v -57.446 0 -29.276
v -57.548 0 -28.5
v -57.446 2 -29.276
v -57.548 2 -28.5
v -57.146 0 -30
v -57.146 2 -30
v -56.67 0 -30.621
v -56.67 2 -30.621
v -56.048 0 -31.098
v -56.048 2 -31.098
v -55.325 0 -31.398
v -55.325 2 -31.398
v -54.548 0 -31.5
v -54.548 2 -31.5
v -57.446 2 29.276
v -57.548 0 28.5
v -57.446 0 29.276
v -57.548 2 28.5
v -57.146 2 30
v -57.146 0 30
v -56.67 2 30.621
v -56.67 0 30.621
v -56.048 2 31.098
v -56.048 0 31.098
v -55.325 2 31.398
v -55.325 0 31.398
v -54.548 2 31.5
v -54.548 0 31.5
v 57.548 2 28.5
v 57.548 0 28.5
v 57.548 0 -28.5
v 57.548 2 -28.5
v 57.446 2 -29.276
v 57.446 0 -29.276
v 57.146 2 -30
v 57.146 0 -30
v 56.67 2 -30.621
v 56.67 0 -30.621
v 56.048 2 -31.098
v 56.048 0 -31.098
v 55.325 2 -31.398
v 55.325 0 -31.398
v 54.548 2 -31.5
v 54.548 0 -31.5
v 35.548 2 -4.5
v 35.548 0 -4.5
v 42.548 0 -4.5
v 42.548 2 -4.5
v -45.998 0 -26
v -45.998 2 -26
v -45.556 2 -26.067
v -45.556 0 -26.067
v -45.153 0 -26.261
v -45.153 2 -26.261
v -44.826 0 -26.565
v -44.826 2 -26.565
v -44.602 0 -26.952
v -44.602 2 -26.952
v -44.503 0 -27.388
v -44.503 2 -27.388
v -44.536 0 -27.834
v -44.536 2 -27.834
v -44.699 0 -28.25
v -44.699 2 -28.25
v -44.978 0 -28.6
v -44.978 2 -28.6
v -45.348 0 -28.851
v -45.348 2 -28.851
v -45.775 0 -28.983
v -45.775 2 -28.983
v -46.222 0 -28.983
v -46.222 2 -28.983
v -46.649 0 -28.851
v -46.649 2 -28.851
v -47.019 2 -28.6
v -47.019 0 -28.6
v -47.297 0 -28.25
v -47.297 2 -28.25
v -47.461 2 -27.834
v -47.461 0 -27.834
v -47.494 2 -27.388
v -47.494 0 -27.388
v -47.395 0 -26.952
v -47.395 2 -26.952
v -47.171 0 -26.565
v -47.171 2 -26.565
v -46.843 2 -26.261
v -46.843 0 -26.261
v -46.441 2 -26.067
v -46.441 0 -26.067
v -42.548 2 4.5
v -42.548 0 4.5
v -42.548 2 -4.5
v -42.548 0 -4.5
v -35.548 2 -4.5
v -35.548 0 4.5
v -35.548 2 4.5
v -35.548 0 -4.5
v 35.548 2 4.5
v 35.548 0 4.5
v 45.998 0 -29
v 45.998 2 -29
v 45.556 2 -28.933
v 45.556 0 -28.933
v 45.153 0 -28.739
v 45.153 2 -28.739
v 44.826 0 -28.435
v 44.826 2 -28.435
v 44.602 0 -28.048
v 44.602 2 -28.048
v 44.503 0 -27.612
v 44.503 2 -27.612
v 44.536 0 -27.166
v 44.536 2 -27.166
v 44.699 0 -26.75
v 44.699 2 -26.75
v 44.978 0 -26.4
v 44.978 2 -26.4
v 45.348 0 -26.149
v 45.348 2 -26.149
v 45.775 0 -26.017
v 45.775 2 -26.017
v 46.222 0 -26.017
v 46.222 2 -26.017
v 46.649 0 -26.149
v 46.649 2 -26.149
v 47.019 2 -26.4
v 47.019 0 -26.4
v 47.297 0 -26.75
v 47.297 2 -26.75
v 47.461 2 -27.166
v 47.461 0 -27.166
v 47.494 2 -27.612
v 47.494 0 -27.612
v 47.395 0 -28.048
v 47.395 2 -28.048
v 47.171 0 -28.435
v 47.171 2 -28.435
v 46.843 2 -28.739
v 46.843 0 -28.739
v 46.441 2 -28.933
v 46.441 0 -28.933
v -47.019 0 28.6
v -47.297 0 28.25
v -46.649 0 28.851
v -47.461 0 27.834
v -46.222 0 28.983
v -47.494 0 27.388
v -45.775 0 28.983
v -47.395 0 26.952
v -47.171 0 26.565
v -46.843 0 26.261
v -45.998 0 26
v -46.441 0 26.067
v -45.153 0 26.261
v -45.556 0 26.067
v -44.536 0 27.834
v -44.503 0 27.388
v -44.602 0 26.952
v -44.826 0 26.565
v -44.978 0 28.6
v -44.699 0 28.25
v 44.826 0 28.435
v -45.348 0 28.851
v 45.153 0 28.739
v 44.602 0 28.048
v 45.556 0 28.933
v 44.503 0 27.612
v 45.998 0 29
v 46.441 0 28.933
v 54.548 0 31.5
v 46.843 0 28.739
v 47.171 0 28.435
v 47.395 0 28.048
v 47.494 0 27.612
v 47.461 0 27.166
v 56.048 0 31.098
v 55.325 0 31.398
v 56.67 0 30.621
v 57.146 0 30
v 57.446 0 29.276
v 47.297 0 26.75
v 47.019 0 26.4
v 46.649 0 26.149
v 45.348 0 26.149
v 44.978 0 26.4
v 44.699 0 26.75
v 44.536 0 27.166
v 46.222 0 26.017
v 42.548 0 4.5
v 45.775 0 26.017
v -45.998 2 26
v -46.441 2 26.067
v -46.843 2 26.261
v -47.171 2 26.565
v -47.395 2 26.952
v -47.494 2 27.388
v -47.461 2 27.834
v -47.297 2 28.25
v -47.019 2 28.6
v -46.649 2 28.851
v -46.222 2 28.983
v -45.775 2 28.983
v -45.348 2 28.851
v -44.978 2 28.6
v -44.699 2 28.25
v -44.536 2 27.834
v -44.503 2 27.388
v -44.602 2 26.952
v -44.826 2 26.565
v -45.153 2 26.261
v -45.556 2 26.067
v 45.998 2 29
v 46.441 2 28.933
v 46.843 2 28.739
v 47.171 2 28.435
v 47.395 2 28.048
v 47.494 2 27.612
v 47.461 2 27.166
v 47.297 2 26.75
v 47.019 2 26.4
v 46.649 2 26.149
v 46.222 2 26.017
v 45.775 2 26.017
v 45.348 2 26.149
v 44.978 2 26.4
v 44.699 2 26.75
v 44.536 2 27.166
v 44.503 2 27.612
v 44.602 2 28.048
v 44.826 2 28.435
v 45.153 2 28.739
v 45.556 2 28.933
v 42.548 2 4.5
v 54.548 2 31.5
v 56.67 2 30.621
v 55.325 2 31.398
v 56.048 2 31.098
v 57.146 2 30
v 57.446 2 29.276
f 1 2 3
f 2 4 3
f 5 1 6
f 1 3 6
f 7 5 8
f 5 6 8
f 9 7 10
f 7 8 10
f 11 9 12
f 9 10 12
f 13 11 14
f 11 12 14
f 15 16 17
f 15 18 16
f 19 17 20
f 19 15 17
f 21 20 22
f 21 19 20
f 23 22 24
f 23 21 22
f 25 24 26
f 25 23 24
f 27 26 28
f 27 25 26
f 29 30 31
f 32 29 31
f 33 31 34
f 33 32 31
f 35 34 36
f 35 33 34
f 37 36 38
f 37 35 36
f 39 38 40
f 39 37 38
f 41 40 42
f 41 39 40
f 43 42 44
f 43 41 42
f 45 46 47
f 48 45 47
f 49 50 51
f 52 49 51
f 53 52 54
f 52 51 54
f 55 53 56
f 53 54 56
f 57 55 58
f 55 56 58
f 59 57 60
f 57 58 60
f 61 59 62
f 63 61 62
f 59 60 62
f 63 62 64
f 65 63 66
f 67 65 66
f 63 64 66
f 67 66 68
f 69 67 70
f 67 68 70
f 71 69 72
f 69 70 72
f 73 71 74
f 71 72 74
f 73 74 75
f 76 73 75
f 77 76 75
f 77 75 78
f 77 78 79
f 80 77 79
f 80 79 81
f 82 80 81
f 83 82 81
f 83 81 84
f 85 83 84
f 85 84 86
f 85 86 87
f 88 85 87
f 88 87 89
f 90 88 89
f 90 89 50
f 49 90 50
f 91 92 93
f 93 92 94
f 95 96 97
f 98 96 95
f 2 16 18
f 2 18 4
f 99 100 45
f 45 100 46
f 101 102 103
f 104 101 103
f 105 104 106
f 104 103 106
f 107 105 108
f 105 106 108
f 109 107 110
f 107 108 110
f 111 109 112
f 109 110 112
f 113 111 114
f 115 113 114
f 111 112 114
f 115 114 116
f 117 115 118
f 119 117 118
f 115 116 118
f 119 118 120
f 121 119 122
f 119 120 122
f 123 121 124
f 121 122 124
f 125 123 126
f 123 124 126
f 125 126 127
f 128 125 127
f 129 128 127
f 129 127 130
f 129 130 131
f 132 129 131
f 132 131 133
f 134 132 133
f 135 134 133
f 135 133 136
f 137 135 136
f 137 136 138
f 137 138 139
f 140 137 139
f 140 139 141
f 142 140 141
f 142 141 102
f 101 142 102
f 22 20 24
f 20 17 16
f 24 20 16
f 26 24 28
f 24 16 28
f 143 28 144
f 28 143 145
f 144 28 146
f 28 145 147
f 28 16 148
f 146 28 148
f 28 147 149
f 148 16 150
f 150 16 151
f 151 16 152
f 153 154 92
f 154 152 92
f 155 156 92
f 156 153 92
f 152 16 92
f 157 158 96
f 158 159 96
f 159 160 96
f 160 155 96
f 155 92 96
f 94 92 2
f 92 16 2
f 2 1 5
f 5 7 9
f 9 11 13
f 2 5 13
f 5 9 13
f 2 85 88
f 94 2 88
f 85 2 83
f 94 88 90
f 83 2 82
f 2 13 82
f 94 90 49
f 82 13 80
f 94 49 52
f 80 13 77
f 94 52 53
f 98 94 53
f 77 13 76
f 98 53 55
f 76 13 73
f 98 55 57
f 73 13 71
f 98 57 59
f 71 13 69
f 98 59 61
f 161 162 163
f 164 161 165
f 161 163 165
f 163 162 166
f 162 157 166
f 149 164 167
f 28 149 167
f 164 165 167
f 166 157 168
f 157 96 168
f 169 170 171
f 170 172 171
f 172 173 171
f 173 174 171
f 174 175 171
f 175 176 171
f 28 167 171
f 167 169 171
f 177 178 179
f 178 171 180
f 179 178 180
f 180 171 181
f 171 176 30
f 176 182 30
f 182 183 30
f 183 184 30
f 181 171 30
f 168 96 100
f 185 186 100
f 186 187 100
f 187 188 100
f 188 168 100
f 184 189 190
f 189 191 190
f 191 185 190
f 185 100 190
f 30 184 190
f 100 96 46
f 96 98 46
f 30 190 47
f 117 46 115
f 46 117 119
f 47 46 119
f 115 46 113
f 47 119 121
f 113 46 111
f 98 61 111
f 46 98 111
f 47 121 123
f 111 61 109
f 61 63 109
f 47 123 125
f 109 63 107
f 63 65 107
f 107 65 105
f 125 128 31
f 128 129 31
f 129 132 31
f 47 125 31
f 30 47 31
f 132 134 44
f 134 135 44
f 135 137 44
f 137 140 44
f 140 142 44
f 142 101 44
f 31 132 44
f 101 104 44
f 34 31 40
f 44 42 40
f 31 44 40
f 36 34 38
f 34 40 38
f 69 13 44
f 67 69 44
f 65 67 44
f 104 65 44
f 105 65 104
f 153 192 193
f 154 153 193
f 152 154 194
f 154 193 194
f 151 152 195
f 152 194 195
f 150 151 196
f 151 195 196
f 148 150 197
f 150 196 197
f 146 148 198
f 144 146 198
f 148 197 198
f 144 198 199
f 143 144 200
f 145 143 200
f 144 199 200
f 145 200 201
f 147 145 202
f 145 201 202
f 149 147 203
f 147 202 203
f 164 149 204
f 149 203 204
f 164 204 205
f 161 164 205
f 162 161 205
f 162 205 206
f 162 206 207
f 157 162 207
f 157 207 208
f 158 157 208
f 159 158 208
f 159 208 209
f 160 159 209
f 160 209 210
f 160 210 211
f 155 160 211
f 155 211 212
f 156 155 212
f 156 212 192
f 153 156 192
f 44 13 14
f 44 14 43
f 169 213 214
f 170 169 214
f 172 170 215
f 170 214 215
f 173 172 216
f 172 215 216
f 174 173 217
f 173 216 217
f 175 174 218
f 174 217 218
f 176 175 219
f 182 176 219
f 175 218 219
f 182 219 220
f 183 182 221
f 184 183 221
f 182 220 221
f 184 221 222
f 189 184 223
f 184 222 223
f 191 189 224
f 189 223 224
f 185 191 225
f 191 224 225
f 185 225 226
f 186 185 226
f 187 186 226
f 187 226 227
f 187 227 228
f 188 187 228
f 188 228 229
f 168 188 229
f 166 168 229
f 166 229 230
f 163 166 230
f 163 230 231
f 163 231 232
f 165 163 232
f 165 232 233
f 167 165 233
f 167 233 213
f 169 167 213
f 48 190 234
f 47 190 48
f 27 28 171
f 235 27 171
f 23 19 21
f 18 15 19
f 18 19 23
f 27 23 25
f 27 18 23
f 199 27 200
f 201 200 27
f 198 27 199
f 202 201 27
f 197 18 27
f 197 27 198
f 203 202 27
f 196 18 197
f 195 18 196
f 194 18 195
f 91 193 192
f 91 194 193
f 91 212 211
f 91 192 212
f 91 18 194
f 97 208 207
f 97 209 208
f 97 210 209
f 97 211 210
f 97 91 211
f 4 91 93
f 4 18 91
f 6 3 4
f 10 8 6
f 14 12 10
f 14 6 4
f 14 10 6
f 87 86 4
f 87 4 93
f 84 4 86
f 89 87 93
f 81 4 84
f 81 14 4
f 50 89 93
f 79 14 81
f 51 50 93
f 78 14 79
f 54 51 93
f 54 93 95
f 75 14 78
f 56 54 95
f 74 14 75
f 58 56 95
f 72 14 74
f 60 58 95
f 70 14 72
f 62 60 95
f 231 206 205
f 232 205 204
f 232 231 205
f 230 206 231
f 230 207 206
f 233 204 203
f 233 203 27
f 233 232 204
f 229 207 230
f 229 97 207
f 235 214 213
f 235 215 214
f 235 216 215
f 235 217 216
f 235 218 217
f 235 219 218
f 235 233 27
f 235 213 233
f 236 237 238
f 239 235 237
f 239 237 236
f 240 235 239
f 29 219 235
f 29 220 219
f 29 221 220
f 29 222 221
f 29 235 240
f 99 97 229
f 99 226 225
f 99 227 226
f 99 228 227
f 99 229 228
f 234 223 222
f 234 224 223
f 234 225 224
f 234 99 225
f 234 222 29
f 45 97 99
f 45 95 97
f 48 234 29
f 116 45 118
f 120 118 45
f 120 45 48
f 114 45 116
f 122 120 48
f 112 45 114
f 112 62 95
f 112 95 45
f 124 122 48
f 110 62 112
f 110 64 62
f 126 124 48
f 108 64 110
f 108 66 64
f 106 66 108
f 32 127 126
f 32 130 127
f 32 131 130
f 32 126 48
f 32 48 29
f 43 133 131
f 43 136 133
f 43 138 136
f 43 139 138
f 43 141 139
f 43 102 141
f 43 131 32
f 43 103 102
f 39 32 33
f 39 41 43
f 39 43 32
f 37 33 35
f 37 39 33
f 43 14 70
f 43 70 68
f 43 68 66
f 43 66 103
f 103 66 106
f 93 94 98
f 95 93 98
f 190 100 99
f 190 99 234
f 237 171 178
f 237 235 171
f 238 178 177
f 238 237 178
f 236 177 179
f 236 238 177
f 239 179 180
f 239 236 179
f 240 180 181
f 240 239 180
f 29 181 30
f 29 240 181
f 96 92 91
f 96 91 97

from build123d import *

# Parameters (mm, degrees)
ESBO_O1_W                  = 115.09677689
ESBO_O1_H                  = 63
RESSALTO_EXTRUS_O1_DEPTH   = 2
FILETE1_R                  = 3
CORTE_EXTRUS_O4_DEPTH      = 66.635866816
CORTE_EXTRUS_O4_DEPTH_BACK = 66.635866816
ESBO_O6_W                  = 7
ESBO_O6_H                  = 9
ESBO_O7_R                  = 1.5
CORTE_EXTRUS_O5_DEPTH      = 66.635866816


with BuildPart() as part:
    # Esboço1 → Ressalto-extrusão1 (new body)
    with BuildSketch(Plane(origin=(0, 0, 0), x_dir=(1, 0, 0), z_dir=(0, 1, 0))):
        Rectangle(ESBO_O1_W, ESBO_O1_H)
    extrude(amount=RESSALTO_EXTRUS_O1_DEPTH)

    # Filete1
    filete1_edges = [part.edges().sort_by_distance(p)[0] for p in [
        (-57.548388445, 1, -31.5),
        (57.548388445, 1, -31.5),
        (57.548388445, 1, 31.5),
        (-57.548388445, 1, 31.5),
    ]]
    fillet(filete1_edges, radius=FILETE1_R)

    # Esboço6 → Corte-extrusão4 (cut, two sides: drawn at the far end of the back side and taken through both)
    with BuildSketch(Plane(origin=(0, 2, 0), x_dir=(1, 0, 0), z_dir=(0, 1, 0)).offset(-CORTE_EXTRUS_O4_DEPTH_BACK)):
        with Locations((-39.048388445, 0)):
            Rectangle(ESBO_O6_W, ESBO_O6_H)
        with Locations((39.048388445, 0)):
            Rectangle(ESBO_O6_W, ESBO_O6_H)
    extrude(amount=CORTE_EXTRUS_O4_DEPTH + CORTE_EXTRUS_O4_DEPTH_BACK, mode=Mode.SUBTRACT)

    # Esboço7 → Corte-extrusão5 (cut, through all)
    with BuildSketch(Plane(origin=(0, 2, 0), x_dir=(1, 0, 0), z_dir=(0, 1, 0))):
        with Locations(Location((-45.998388445, 27.5, 0), (0, 0, 270))):
            Circle(ESBO_O7_R)
        with Locations(Location((45.998388445, 27.5, 0), (0, 0, 90))):
            Circle(ESBO_O7_R)
        with Locations(Location((45.998388445, -27.5, 0), (0, 0, 270))):
            Circle(ESBO_O7_R)
        with Locations(Location((-45.998388445, -27.5, 0), (0, 0, 90))):
            Circle(ESBO_O7_R)
    extrude(amount=-CORTE_EXTRUS_O5_DEPTH, mode=Mode.SUBTRACT)


solid = part.part
